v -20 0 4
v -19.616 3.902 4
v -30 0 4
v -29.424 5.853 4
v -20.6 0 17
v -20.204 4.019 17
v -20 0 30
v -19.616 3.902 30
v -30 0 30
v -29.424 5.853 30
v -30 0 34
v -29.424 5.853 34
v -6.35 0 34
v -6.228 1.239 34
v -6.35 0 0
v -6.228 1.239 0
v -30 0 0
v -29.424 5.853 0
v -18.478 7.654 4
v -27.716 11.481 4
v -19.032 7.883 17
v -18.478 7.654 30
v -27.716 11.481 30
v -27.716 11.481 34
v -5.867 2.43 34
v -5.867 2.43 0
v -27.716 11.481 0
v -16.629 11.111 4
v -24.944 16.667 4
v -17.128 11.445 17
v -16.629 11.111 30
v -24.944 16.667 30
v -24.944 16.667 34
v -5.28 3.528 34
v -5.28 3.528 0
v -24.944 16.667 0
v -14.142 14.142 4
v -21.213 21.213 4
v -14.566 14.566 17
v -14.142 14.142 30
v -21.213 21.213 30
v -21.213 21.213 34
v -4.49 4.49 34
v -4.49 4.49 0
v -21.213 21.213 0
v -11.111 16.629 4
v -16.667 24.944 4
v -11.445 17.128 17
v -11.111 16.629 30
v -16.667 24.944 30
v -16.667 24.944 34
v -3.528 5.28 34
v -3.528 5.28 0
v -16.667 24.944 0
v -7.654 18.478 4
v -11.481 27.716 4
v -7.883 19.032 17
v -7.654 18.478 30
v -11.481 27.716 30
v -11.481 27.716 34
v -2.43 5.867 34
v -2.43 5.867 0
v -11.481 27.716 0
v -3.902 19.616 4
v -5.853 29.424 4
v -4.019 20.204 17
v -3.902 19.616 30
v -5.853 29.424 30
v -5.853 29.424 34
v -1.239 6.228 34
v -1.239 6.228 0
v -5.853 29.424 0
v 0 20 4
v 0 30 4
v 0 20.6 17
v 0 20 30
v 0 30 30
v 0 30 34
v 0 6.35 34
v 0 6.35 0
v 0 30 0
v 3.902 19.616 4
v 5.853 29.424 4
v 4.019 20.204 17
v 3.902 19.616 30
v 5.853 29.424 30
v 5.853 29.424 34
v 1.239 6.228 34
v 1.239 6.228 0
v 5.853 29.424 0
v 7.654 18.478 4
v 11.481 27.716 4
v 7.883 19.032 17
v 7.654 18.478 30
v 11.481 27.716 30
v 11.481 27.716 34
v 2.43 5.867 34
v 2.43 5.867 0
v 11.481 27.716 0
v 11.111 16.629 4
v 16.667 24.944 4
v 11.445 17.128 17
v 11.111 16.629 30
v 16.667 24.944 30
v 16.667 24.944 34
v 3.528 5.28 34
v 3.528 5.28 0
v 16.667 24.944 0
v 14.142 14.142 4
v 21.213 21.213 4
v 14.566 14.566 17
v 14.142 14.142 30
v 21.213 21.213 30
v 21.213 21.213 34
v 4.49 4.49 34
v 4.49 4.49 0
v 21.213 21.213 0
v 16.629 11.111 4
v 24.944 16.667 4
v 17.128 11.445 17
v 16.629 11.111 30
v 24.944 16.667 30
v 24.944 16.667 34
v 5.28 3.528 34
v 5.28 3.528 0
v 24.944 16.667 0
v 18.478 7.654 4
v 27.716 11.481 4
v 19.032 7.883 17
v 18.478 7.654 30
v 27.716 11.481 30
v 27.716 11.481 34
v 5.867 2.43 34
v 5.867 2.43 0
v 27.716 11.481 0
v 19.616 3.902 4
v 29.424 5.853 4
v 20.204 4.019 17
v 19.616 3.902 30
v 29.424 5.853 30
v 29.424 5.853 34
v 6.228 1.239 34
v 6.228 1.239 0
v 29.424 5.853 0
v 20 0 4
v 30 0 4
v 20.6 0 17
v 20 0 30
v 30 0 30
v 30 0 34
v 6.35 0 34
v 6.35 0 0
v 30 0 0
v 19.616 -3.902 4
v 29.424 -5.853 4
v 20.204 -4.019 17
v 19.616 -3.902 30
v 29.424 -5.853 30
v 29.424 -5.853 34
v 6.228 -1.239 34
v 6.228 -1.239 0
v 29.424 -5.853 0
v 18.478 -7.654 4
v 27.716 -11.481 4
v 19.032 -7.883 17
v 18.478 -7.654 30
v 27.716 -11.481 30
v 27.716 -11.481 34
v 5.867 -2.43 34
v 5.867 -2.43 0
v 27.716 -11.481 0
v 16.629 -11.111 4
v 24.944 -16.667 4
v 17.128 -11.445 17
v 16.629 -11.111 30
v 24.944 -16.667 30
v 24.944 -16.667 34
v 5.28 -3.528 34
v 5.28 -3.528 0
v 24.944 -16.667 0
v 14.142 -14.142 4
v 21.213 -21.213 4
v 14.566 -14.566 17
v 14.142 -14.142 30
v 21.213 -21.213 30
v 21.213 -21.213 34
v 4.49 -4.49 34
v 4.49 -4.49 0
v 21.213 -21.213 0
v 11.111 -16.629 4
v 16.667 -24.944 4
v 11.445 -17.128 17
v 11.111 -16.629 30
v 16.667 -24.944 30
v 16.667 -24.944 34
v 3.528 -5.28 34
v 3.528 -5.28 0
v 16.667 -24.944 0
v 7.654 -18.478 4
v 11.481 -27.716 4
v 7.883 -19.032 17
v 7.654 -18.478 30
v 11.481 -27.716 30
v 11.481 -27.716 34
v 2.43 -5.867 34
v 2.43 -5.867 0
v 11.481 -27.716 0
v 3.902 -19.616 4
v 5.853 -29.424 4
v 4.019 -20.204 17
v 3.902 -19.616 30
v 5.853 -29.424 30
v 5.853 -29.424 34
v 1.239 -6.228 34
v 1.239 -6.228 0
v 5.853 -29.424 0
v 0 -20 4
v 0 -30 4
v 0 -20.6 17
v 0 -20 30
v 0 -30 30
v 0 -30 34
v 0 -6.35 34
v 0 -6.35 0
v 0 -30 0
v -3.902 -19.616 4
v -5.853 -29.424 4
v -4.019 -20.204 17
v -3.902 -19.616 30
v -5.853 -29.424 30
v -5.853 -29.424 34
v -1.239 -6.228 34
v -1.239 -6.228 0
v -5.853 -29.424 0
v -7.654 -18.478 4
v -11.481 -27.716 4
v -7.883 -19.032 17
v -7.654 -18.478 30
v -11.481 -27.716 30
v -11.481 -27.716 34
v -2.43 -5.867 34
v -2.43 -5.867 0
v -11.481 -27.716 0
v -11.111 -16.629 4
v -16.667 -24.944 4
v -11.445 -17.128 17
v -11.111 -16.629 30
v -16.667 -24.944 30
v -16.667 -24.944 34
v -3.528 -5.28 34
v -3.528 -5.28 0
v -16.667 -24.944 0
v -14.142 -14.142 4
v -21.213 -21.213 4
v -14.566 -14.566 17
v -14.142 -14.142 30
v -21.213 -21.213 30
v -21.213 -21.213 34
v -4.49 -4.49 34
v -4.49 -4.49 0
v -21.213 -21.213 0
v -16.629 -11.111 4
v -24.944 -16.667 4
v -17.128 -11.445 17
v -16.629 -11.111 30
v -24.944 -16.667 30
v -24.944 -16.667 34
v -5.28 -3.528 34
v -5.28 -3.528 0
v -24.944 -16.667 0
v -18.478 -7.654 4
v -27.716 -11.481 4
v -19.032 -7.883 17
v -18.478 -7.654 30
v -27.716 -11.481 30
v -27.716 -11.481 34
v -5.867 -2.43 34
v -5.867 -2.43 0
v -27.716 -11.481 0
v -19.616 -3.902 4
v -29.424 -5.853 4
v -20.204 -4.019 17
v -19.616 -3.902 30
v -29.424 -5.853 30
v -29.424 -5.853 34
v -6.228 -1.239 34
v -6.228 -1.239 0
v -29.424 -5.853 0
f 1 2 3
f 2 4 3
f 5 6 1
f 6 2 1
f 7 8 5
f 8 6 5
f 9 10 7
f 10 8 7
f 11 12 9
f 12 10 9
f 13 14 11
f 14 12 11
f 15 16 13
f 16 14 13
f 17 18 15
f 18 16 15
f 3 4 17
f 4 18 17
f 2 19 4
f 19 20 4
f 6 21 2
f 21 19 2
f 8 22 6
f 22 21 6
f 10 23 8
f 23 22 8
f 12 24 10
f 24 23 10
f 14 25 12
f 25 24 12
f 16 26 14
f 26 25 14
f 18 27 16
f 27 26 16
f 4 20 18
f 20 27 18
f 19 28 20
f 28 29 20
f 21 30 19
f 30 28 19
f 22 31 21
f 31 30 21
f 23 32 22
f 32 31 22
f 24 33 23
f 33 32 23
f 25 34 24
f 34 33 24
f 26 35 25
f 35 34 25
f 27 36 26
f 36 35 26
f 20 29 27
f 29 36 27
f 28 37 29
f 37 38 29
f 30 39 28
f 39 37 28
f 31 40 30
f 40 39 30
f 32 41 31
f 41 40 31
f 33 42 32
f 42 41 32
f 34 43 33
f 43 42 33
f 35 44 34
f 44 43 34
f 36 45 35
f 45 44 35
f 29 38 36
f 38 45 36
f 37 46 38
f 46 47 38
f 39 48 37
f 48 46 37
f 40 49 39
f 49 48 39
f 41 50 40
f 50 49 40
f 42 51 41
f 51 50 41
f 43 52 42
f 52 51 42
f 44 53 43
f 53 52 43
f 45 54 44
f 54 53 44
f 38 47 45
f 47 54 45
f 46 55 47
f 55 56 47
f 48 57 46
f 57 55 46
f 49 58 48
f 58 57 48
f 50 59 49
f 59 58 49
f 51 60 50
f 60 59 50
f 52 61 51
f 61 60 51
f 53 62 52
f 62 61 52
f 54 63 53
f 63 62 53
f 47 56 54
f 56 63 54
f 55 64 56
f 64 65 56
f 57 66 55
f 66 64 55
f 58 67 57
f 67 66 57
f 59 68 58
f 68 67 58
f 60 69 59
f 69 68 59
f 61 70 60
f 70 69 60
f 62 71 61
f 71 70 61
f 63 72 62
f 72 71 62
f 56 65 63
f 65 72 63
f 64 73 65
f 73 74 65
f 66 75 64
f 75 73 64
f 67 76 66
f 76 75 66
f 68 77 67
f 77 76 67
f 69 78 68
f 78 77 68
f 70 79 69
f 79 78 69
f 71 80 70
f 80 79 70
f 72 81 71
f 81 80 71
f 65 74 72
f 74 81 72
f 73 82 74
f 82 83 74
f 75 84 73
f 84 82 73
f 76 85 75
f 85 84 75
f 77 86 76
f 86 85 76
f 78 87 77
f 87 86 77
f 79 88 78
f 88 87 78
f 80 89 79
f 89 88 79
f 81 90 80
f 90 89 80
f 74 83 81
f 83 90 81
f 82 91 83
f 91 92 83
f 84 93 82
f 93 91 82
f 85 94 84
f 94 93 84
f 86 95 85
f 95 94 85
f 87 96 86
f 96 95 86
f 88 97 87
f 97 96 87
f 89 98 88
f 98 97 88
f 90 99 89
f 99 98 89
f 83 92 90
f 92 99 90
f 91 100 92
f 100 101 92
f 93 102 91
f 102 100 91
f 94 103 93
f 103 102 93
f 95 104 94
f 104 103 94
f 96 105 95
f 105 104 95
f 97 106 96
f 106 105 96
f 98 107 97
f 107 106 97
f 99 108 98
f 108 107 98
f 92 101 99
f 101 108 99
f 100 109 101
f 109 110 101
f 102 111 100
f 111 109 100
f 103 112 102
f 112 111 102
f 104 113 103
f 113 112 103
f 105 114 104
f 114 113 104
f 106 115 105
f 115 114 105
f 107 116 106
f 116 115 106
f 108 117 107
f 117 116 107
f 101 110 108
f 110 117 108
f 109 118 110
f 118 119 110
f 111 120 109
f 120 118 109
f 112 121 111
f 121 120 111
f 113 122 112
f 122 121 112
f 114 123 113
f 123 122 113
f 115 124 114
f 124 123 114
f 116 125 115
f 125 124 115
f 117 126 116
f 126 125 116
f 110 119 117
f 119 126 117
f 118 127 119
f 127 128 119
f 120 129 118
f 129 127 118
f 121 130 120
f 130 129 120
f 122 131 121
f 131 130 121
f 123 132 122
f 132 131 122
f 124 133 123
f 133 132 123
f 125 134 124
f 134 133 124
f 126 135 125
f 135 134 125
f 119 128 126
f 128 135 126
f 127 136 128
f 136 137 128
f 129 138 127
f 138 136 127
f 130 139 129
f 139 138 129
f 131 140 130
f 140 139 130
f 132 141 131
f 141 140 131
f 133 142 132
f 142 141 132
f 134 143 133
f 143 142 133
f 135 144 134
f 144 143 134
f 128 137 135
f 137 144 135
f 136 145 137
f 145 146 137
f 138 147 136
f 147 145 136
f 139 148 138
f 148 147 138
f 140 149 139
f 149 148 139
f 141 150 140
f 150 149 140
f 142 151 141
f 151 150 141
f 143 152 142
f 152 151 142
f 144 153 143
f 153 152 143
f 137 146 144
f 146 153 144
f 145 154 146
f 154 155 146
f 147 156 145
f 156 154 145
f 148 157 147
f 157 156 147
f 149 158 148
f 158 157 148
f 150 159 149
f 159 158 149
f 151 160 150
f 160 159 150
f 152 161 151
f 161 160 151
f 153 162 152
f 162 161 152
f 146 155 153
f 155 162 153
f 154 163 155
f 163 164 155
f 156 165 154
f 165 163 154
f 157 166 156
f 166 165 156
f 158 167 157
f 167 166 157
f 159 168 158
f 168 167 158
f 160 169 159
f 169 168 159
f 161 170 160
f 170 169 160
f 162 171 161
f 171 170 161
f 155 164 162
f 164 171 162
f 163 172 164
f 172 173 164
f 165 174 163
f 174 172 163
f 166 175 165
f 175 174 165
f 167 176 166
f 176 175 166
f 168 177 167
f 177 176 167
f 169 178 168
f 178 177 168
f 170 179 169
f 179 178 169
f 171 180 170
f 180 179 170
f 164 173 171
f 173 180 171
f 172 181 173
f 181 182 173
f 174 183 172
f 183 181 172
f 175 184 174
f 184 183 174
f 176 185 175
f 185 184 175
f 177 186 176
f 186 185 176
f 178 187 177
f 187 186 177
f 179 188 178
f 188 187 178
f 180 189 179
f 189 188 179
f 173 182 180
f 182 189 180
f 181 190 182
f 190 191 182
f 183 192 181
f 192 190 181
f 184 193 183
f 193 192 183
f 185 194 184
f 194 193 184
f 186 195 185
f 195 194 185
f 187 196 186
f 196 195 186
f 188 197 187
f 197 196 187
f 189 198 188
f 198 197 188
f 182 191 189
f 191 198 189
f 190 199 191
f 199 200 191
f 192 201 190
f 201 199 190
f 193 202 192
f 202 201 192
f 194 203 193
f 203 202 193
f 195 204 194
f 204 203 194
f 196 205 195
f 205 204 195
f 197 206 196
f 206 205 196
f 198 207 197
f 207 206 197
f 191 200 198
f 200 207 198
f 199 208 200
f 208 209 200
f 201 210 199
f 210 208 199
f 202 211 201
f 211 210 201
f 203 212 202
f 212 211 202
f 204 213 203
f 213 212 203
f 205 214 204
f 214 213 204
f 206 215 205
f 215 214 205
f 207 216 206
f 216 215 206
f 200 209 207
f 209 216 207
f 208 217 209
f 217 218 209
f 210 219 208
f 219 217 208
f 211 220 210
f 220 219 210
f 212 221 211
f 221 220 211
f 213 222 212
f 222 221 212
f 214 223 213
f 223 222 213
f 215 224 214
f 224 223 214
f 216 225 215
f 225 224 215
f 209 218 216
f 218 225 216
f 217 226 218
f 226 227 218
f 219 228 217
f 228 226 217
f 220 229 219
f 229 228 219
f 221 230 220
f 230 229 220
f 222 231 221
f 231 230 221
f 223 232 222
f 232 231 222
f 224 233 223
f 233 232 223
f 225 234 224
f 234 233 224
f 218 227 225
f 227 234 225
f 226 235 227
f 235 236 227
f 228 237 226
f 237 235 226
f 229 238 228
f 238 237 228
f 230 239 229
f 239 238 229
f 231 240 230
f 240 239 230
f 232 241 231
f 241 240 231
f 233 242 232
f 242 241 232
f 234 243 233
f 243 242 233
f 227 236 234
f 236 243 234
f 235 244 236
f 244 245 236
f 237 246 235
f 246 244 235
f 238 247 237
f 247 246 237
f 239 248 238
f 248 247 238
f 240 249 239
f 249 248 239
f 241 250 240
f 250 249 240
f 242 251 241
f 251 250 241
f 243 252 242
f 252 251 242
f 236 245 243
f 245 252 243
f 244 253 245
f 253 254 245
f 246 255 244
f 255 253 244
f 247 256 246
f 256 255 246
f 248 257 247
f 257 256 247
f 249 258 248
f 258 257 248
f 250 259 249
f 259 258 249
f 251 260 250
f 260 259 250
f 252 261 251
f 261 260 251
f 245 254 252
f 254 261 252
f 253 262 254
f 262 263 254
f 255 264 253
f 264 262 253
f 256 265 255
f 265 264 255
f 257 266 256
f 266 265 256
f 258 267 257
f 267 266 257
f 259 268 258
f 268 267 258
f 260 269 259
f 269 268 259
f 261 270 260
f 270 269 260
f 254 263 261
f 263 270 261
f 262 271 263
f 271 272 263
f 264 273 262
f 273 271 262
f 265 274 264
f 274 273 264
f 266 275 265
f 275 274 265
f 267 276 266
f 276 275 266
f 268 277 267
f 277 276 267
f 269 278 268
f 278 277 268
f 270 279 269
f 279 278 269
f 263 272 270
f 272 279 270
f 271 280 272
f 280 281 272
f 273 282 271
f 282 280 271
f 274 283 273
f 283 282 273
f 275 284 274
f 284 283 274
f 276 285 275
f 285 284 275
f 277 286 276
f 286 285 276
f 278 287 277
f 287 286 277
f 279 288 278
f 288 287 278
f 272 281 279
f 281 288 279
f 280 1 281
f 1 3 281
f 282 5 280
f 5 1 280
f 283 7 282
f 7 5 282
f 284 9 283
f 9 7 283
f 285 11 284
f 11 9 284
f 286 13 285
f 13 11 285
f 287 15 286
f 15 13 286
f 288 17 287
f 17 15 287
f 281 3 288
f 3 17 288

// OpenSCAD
$fn = 32;

// ----------------------------------------------------------------------
// Belt roller: 40 mm barrel, 34 mm wide, bore 12.7 mm
// ----------------------------------------------------------------------

// --- parameters (mm) ---
bore_d = 12.7;            // bore
barrel_d = 40;            // barrel diameter
roller_w = 34;            // roller width
flange_d = 60;            // flange diameter
flange_t = 4;             // flange thickness
hub_d = 32.7;             // hub diameter

roller_profile = [[6.35, 0], [30, 0], [30, 4], [20, 4], [20.6, 17], [20, 30], [30, 30], [30, 34], [6.35, 34]];

/* the profile stays clear of the axis, so the bore comes out of the revolve */
rotate_extrude() polygon(roller_profile);
